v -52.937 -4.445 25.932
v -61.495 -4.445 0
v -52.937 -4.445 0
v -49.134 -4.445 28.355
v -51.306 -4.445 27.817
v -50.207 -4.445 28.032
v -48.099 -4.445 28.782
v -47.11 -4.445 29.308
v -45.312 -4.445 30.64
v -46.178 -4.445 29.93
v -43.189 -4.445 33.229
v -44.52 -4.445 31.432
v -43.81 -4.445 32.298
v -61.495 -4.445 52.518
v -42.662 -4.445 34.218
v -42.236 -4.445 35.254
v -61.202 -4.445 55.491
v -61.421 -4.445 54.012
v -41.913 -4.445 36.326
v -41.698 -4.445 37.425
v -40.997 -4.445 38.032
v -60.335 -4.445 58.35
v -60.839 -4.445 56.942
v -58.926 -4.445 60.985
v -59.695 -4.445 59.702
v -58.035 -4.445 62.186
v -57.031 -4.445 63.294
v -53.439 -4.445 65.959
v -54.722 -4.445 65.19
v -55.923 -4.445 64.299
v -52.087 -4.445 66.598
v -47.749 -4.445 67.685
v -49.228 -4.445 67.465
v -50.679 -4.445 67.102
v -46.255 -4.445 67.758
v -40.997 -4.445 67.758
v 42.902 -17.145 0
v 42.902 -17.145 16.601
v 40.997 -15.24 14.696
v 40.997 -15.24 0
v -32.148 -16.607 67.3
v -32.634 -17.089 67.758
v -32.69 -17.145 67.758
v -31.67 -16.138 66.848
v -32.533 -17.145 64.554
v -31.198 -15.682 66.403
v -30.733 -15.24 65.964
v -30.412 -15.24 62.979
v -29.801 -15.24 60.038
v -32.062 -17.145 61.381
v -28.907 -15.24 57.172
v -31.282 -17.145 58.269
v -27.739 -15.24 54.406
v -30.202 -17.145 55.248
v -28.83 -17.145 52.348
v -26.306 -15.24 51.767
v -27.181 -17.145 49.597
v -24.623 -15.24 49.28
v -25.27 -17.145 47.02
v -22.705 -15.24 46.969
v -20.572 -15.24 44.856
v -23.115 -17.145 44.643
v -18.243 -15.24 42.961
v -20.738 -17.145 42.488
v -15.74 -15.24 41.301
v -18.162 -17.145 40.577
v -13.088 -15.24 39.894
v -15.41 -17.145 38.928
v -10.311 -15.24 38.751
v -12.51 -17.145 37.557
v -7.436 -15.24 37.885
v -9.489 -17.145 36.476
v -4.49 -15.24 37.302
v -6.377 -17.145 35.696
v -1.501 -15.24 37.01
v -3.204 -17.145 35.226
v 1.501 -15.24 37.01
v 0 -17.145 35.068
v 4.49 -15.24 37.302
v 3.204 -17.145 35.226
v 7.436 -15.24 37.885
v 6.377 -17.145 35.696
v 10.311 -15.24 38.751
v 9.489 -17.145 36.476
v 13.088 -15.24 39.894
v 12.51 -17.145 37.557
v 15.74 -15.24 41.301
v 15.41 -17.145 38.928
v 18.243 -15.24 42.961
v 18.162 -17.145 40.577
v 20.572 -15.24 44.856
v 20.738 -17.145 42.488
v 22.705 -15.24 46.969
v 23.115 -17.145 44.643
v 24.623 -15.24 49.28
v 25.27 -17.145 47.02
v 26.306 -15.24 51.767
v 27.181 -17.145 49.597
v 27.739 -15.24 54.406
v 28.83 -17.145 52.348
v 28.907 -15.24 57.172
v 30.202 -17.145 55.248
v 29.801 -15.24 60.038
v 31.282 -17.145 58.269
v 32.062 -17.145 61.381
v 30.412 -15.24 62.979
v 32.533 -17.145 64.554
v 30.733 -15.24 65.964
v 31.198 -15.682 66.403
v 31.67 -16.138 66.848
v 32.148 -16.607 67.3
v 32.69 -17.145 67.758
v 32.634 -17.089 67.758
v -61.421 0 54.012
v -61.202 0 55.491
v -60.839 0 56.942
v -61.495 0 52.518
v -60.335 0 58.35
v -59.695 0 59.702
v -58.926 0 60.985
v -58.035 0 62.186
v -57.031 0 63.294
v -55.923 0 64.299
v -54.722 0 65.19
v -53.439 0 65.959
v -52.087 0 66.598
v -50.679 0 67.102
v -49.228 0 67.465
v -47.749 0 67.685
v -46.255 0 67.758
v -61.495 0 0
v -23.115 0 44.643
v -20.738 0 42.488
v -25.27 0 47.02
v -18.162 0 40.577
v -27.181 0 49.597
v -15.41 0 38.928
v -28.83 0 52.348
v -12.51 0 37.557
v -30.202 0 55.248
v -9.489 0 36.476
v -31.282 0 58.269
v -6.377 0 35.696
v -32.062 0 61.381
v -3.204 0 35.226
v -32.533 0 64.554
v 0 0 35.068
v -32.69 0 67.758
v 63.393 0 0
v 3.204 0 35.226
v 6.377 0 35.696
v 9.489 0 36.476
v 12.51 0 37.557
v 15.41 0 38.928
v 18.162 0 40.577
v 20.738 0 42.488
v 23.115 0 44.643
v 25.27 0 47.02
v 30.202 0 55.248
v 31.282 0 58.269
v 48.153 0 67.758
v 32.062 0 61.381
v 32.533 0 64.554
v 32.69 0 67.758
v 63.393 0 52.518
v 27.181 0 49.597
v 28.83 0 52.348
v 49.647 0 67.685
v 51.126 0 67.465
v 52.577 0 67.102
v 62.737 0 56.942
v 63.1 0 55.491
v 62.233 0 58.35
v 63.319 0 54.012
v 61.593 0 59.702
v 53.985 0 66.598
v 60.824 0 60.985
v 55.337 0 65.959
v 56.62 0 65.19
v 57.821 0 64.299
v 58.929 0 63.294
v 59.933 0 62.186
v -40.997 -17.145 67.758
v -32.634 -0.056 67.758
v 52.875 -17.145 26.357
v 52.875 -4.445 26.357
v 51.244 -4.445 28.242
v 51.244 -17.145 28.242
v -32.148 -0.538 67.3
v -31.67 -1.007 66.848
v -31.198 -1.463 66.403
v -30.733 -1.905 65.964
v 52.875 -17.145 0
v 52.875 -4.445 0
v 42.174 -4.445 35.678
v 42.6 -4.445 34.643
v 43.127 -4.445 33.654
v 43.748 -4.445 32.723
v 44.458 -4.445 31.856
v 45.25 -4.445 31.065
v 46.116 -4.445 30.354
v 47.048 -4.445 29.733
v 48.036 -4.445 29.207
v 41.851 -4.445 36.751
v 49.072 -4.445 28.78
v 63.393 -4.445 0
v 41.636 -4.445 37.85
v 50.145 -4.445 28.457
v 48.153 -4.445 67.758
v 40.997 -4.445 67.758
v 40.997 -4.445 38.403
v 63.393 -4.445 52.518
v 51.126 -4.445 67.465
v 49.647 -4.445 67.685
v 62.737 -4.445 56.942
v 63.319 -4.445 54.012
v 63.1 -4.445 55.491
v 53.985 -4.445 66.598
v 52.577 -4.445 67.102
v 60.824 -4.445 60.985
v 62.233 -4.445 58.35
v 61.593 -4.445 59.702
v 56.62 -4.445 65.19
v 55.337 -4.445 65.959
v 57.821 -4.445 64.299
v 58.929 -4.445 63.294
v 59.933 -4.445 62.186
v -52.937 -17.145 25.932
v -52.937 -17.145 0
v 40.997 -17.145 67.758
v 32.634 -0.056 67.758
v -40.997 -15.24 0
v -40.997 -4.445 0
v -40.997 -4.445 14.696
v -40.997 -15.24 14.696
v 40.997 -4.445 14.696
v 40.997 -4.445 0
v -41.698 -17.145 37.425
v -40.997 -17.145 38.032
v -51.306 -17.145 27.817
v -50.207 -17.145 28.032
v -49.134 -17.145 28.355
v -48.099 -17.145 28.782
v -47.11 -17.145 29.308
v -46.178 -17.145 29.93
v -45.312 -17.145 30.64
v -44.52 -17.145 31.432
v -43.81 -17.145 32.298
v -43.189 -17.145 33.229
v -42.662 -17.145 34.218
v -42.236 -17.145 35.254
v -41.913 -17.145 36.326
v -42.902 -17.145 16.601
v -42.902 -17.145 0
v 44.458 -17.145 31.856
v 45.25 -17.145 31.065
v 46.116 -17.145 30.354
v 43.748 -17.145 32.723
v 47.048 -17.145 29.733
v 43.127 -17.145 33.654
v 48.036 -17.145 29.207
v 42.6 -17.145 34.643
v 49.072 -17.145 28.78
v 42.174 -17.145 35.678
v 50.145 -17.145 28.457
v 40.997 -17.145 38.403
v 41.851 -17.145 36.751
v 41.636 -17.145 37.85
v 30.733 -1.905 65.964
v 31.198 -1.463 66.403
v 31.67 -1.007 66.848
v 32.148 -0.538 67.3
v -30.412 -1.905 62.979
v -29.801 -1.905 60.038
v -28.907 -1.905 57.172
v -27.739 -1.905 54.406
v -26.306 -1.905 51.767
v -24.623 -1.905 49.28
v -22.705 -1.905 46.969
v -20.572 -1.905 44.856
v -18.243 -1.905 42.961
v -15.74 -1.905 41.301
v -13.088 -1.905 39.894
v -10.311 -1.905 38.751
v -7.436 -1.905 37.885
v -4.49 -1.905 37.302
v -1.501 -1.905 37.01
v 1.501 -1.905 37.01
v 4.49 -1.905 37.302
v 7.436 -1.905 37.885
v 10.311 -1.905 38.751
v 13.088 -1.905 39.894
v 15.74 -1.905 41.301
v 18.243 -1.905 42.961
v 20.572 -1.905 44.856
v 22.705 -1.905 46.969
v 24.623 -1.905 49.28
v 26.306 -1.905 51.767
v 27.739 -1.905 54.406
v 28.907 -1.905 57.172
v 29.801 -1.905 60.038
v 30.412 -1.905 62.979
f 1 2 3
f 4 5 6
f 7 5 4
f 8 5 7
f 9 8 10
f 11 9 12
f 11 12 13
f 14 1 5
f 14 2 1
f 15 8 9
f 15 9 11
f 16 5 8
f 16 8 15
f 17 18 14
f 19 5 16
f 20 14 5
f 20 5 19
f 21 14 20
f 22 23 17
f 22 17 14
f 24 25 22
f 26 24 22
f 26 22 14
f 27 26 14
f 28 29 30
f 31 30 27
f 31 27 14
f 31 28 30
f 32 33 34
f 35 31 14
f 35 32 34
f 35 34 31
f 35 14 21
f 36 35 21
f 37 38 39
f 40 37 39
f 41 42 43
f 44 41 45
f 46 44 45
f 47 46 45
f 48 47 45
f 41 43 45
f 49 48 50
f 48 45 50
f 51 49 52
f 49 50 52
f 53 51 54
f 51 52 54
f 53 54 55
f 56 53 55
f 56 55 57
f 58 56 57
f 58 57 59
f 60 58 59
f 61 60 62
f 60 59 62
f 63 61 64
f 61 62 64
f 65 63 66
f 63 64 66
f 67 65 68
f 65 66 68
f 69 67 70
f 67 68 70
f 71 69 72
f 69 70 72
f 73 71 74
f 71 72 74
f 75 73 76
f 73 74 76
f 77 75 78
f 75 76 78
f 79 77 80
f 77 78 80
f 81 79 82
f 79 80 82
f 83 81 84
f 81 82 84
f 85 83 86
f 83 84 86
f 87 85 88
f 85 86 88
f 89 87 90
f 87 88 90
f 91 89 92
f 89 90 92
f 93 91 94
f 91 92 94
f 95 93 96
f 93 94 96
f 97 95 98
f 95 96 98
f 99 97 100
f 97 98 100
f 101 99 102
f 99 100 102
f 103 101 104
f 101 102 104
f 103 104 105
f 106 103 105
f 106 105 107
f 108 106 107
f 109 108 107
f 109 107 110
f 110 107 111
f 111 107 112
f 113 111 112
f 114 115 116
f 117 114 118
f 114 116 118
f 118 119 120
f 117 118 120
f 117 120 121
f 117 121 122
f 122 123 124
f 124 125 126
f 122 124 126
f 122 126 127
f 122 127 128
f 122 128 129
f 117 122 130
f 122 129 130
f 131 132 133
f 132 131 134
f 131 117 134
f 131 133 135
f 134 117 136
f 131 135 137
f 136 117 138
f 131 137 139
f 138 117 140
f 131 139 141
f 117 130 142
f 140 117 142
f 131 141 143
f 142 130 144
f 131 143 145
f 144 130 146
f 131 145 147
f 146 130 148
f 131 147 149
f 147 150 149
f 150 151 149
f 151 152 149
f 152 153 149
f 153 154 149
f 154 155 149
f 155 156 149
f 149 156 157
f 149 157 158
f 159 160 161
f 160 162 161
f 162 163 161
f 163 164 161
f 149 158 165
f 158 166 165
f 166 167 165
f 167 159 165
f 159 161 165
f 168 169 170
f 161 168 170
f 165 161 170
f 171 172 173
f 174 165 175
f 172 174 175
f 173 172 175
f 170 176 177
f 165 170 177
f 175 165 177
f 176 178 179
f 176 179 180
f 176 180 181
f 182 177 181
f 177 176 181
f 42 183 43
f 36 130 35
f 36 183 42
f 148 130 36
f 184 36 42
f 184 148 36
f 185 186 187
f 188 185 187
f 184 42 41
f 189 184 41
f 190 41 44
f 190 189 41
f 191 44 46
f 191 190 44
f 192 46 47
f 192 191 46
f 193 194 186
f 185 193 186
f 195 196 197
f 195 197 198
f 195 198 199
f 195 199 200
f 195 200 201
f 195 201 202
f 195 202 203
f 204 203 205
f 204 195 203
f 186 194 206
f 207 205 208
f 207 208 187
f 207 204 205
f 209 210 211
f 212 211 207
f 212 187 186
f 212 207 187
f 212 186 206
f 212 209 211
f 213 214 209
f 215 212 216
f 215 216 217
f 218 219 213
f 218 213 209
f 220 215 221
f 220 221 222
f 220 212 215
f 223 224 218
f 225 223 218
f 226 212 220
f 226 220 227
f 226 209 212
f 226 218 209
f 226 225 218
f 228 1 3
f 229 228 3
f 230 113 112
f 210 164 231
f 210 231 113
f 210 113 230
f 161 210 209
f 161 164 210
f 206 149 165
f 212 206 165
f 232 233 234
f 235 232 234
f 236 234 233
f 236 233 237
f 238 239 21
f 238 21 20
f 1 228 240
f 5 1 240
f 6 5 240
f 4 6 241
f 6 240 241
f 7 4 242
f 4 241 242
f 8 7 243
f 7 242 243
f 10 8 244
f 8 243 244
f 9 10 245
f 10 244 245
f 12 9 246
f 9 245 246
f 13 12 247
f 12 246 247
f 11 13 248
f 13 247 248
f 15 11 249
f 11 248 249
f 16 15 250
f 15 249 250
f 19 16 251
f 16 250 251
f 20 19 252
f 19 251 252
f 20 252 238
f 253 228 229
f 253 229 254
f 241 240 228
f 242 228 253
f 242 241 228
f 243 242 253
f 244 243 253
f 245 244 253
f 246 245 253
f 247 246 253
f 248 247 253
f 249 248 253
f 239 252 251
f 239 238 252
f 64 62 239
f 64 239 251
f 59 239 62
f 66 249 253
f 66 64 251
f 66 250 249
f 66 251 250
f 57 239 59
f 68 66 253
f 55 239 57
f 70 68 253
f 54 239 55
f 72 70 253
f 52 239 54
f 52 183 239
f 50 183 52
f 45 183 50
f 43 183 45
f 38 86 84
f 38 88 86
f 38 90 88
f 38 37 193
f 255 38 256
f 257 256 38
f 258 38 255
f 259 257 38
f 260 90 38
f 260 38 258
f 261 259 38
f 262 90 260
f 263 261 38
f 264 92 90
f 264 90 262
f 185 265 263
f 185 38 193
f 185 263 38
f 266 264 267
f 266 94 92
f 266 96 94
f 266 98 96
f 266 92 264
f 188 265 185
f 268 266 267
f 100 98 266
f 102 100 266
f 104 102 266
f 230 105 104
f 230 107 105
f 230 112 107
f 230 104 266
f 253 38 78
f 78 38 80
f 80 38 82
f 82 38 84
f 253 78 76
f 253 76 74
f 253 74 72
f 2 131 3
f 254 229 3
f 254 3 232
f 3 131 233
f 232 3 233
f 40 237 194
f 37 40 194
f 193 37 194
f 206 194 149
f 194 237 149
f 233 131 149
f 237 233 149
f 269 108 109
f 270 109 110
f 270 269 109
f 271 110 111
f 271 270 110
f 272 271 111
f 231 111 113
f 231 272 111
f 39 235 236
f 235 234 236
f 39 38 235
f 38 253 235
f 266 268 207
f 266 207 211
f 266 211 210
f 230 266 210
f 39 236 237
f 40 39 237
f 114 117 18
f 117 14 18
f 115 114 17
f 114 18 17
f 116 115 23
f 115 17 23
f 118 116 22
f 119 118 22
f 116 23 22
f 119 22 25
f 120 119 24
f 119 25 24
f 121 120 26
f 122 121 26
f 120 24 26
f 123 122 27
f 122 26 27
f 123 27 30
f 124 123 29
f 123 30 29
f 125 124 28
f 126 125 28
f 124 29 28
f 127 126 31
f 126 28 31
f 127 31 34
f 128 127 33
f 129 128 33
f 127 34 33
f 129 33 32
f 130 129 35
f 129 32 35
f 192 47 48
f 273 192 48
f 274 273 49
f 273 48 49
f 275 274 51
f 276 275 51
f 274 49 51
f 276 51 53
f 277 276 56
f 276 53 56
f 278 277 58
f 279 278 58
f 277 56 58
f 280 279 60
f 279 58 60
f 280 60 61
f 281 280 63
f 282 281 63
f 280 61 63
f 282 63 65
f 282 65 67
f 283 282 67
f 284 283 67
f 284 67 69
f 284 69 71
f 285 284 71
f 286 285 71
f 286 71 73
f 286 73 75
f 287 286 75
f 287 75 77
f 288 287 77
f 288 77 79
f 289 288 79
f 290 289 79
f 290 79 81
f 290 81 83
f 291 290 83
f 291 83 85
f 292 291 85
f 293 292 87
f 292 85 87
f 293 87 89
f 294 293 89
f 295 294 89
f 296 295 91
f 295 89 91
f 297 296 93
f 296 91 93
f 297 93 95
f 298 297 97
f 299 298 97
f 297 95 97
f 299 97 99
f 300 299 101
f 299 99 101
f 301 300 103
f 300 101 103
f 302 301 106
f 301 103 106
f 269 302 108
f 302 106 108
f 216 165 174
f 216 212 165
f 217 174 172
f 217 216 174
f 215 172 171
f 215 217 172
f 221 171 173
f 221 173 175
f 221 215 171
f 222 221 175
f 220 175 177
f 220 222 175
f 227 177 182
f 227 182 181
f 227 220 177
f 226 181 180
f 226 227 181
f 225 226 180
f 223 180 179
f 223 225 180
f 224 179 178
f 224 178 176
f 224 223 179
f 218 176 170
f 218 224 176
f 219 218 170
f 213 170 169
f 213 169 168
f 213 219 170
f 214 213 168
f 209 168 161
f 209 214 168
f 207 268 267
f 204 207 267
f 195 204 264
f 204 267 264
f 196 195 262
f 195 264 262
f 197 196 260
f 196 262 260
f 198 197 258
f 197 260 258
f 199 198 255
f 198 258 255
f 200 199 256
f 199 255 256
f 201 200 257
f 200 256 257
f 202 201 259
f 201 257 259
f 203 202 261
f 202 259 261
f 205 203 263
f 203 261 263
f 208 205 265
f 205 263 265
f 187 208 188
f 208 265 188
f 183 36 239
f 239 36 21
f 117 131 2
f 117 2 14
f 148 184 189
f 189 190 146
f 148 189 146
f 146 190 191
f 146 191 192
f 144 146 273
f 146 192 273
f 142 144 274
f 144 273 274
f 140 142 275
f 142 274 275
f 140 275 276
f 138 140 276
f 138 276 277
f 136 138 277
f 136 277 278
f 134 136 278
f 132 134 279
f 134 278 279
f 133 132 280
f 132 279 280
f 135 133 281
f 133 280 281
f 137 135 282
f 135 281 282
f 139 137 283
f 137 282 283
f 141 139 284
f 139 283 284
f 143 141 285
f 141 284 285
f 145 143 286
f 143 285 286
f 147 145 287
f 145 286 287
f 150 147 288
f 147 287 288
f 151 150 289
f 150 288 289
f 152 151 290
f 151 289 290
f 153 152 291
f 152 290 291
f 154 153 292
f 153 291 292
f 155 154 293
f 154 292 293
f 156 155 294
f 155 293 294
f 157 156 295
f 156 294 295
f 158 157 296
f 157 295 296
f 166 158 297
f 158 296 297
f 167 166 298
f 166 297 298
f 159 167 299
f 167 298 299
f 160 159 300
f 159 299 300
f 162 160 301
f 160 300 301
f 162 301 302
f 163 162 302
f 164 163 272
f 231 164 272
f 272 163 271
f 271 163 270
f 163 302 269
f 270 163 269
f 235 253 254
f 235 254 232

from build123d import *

# Parameters (mm, degrees)
F0_W         = 124.8875334859
F0_H         = 67.7581354976
F1_DEPTH     = 4.445
F2_R         = 15.24
F4_DEPTH     = 12.7
F6_DEPTH     = 50.8
F8_DEPTH     = 12.7
F9_T1_DEPTH  = 26.6729642247
F9_T3_DEPTH  = 19.5947973283
F9_T5_DEPTH  = 81.9930359721
F9_T7_DEPTH  = 17.2644261819
F9_T10_ANGLE = 198.2651986278
F9_T12_ANGLE = 198.2651986278
F9_T16_DEPTH = 17.2644261819
F9_T21_DEPTH = 17.2644261819
F9_T27_DEPTH = 86.8920920642
F9_T31_DEPTH = 19.5947973283
F9_T38_DEPTH = 19.5947973283
F9_T42_DEPTH = 86.8920920642


# Not quite as in the source:
# - a fillet or chamfer that OpenCascade refuses, or shapes differently, is made with other operations: its cross-section is extruded or revolved along the edge and cut away or added


with BuildPart() as f1:
    # F0 (on Front) → F1 (new body)
    with BuildSketch(Plane.XZ):
        with Locations((0.9489916265, 33.8790677488)):
            Rectangle(F0_W, F0_H)
    extrude(amount=F1_DEPTH)

    # F2
    f2_edges = [f1.edges().sort_by_distance(p)[0] for p in [
        (-61.494775, -2.2225, 67.758135),
        (63.392758, -2.2225, 67.758135),
    ]]
    fillet(f2_edges, radius=F2_R)

    # F3 (on face) → F4 (join)
    with BuildSketch(Plane.XZ.offset(4.445)):
        Polygon((40.9965217113, 67.7581354976), (-40.9965142608, 67.7581354976), (-40.9965142608, 39.0565320849), (-40.9965142608, 14.6957412362), (40.9965217113, 14.6957412362), (40.9965217113, 39.4814237952), align=None)
        Polygon((-40.9965142608, 14.6957412362), (-40.9965142608, 39.0565320849), (-52.9372058809, 39.0565320849), (-52.9372058809, 0), (-40.9965142608, 0), align=None)
        Polygon((52.8750233352, 39.4814237952), (40.9965217113, 39.4814237952), (40.9965217113, 14.6957412362), (40.9965217113, 0), (52.8750233352, 0), align=None)
    extrude(amount=F4_DEPTH)

    # F5 (on face) → F6 (cut)
    with BuildSketch(Plane.XZ.offset(17.145)):
        with BuildLine():
            ThreePointArc((-30.7849538809, 67.7581354976), (0, 36.9731816167), (30.7849538809, 67.7581354976))
            Line((30.7849538809, 67.7581354976), (-30.7849538809, 67.7581354976))
        make_face()
        with BuildLine():
            Line((-30.7849538809, 67.7581354976), (30.7849538809, 67.7581354976))
            ThreePointArc((30.7849538809, 67.7581354976), (0, 98.5430893784), (-30.7849538809, 67.7581354976))
        make_face()
    extrude(amount=-F6_DEPTH, mode=Mode.SUBTRACT)

    # F7 (on face) → F8 (cut)
    with BuildSketch(Plane.XZ.offset(17.145)):
        with BuildLine():
            ThreePointArc((-52.9372058809, 27.6993892785), (-44.9064931875, 31.0258193916), (-41.5800630744, 39.0565320849))
            Line((-41.5800630744, 39.0565320849), (-52.9372058809, 39.0565320849))
            Line((-52.9372058809, 39.0565320849), (-52.9372058809, 27.6993892785))
        make_face()
        with BuildLine():
            Line((52.8750233352, 39.4814237952), (41.5178805288, 39.4814237952))
            ThreePointArc((41.5178805288, 39.4814237952), (44.8443106419, 31.4507111019), (52.8750233352, 28.1242809888))
            Line((52.8750233352, 28.1242809888), (52.8750233352, 39.4814237952))
        make_face()
    extrude(amount=-F8_DEPTH, mode=Mode.SUBTRACT)

    # F9: chamfer of 1.905 on 11 edges, made by hand

    # F9_s2 → F9_t1 (cut)
    with BuildSketch(Plane.XZ.offset(-4.7639821123)):
        with BuildLine():
            Line((-32.6343999444, 67.7581354976), (-30.7326373381, 65.964148961))
            ThreePointArc((-30.7326373381, 65.964148961), (-30.7710738122, 66.8337968736), (-30.7849538809, 67.7581354976))
            Line((-30.7849538809, 67.7581354976), (-32.6343999444, 67.7581354976))
        make_face()
        with BuildLine():
            Line((30.7326373381, 65.964148961), (32.6343999444, 67.7581354976))
            Line((32.6343999444, 67.7581354976), (30.7849538809, 67.7581354976))
            ThreePointArc((30.7849538809, 67.7581354976), (30.7710738122, 66.8337968736), (30.7326373381, 65.964148961))
        make_face()
    extrude(amount=F9_T1_DEPTH, mode=Mode.SUBTRACT)

    # F9_s4 → F9_t3 (cut)
    with BuildSketch(Plane.XY.offset(-4.8990560921)):
        Polygon((-42.9015142608, -17.145), (-40.9965142608, -15.24), (-40.9965142608, -17.145), align=None)
        Polygon((42.9015217113, -17.145), (40.9965217113, -15.24), (40.9965217113, -17.145), align=None)
    extrude(amount=F9_T3_DEPTH, mode=Mode.SUBTRACT)

    # F9_s6 → F9_t5 (cut)
    with BuildSketch(Plane.YZ.offset(-40.9965142608)):
        Polygon((-17.145, 16.6007412362), (-15.24, 14.6957412362), (-17.145, 14.6957412362), align=None)
    extrude(amount=F9_T5_DEPTH, mode=Mode.SUBTRACT)

    # F9_s8 → F9_t7 (cut)
    with BuildSketch(Plane.XZ.offset(4.445)):
        with BuildLine():
            Line((52.8750233352, 26.356813065), (51.2436612422, 28.24205769))
            ThreePointArc((51.2436612422, 28.24205769), (52.0302167258, 28.1557452496), (52.8750233352, 28.1242809888))
            Line((52.8750233352, 28.1242809888), (52.8750233352, 26.356813065))
        make_face()
        with BuildLine():
            Line((-52.9372058809, 25.9319213547), (-51.3058437879, 27.8171659797))
            ThreePointArc((-51.3058437879, 27.8171659797), (-52.0923992715, 27.7308535393), (-52.9372058809, 27.6993892785))
            Line((-52.9372058809, 27.6993892785), (-52.9372058809, 25.9319213547))
        make_face()
    extrude(amount=F9_T7_DEPTH, mode=Mode.SUBTRACT)

    # F9_s9 → F9_t10 (revolve, cut)
    with BuildSketch(Plane(origin=(10.6182323587, 0, 66.0511732612), x_dir=(0, 1, 0), z_dir=(0.1587198459, 0, 0.9873236605))):
        Polygon((-15.24, 41.539514704), (-17.145, 43.444514704), (-17.145, 41.539514704), align=None)
    revolve(axis=Axis((0, -17.145, 67.7581354976), (0, -1, 0)), revolution_arc=F9_T10_ANGLE, mode=Mode.SUBTRACT)

    # F9_s11 → F9_t12 (revolve, cut)
    with BuildSketch(Plane(origin=(10.6182323587, 0, 66.0511732612), x_dir=(0, 1, 0), z_dir=(0.1587198459, 0, 0.9873236605))):
        Polygon((0, 43.444514704), (-1.905, 41.539514704), (0, 41.539514704), align=None)
    revolve(axis=Axis((0, 0, 67.7581354976), (0, -1, 0)), revolution_arc=F9_T12_ANGLE, mode=Mode.SUBTRACT)


with BuildPart() as f9_tool14:
    # F9_s15 → F9_t16 (new body)
    with BuildSketch(Plane.XZ.offset(21.7094261819)):
        with BuildLine():
            Line((41.63565723, 37.8500617022), (39.750412605, 39.4814237952))
            Line((39.750412605, 39.4814237952), (41.5178805288, 39.4814237952))
            ThreePointArc((41.5178805288, 39.4814237952), (41.5493447896, 38.6366171858), (41.63565723, 37.8500617022))
        make_face()
    extrude(amount=-F9_T16_DEPTH)

    split(bisect_by=Plane.YZ.offset(40.9965217113), keep=Keep.TOP)


with BuildPart() as f1_1:
    add(f1.part)

    # F9_t13: cut F9_tool14
    add(f9_tool14.part, mode=Mode.SUBTRACT)


with BuildPart() as f9_tool19:
    # F9_s20 → F9_t21 (new body)
    with BuildSketch(Plane.XZ.offset(21.7094261819)):
        with BuildLine():
            Line((-39.8125951507, 39.0565320849), (-41.6978397756, 37.4251699919))
            ThreePointArc((-41.6978397756, 37.4251699919), (-41.6115273352, 38.2117254755), (-41.5800630744, 39.0565320849))
            Line((-41.5800630744, 39.0565320849), (-39.8125951507, 39.0565320849))
        make_face()
    extrude(amount=-F9_T21_DEPTH)

    split(bisect_by=Plane.YZ.offset(-40.9965142608), keep=Keep.BOTTOM)


with BuildPart() as f1_2:
    add(f1_1.part)

    # F9_t18: cut F9_tool19
    add(f9_tool19.part, mode=Mode.SUBTRACT)


with BuildPart() as f9_tool25:
    # F9_s26 → F9_t27 (new body)
    with BuildSketch(Plane.YZ.offset(-45.8955703528)):
        Polygon((-17.145, 16.6007412362), (-15.24, 14.6957412362), (-17.145, 14.6957412362), align=None)
    extrude(amount=F9_T27_DEPTH)

    split(bisect_by=Plane.YZ.offset(-40.9965142608), keep=Keep.BOTTOM)


with BuildPart() as f9_tool29:
    # F9_s30 → F9_t31 (new body)
    with BuildSketch(Plane.XY):
        Polygon((-42.9015142608, -17.145), (-40.9965142608, -15.24), (-40.9965142608, -17.145), align=None)
    extrude(amount=F9_T31_DEPTH)

    split(bisect_by=Plane.XY.offset(14.6957412362), keep=Keep.TOP)


with BuildPart() as f9_tool25_1:
    add(f9_tool25.part)

    # F9_t33: intersect F9_tool29
    add(f9_tool29.part, mode=Mode.INTERSECT)


with BuildPart() as f1_3:
    add(f1_2.part)

    # F9_t23: cut F9_tool25
    add(f9_tool25_1.part, mode=Mode.SUBTRACT)


with BuildPart() as f9_tool36:
    # F9_s37 → F9_t38 (new body)
    with BuildSketch(Plane.XY.offset(19.5947973283)):
        Polygon((42.9015217113, -17.145), (40.9965217113, -15.24), (40.9965217113, -17.145), align=None)
    extrude(amount=-F9_T38_DEPTH)

    split(bisect_by=Plane.XY.offset(14.6957412362), keep=Keep.TOP)


with BuildPart() as f9_tool40:
    # F9_s41 → F9_t42 (new body)
    with BuildSketch(Plane.YZ.offset(-40.9965142608)):
        Polygon((-17.145, 16.6007412362), (-15.24, 14.6957412362), (-17.145, 14.6957412362), align=None)
    extrude(amount=F9_T42_DEPTH)

    split(bisect_by=Plane.YZ.offset(40.9965217113), keep=Keep.TOP)


with BuildPart() as f9_tool36_1:
    add(f9_tool36.part)

    # F9_t44: intersect F9_tool40
    add(f9_tool40.part, mode=Mode.INTERSECT)


with BuildPart() as f1_4:
    add(f1_3.part)

    # F9_t34: cut F9_tool36
    add(f9_tool36_1.part, mode=Mode.SUBTRACT)


solid = f1_4.part
